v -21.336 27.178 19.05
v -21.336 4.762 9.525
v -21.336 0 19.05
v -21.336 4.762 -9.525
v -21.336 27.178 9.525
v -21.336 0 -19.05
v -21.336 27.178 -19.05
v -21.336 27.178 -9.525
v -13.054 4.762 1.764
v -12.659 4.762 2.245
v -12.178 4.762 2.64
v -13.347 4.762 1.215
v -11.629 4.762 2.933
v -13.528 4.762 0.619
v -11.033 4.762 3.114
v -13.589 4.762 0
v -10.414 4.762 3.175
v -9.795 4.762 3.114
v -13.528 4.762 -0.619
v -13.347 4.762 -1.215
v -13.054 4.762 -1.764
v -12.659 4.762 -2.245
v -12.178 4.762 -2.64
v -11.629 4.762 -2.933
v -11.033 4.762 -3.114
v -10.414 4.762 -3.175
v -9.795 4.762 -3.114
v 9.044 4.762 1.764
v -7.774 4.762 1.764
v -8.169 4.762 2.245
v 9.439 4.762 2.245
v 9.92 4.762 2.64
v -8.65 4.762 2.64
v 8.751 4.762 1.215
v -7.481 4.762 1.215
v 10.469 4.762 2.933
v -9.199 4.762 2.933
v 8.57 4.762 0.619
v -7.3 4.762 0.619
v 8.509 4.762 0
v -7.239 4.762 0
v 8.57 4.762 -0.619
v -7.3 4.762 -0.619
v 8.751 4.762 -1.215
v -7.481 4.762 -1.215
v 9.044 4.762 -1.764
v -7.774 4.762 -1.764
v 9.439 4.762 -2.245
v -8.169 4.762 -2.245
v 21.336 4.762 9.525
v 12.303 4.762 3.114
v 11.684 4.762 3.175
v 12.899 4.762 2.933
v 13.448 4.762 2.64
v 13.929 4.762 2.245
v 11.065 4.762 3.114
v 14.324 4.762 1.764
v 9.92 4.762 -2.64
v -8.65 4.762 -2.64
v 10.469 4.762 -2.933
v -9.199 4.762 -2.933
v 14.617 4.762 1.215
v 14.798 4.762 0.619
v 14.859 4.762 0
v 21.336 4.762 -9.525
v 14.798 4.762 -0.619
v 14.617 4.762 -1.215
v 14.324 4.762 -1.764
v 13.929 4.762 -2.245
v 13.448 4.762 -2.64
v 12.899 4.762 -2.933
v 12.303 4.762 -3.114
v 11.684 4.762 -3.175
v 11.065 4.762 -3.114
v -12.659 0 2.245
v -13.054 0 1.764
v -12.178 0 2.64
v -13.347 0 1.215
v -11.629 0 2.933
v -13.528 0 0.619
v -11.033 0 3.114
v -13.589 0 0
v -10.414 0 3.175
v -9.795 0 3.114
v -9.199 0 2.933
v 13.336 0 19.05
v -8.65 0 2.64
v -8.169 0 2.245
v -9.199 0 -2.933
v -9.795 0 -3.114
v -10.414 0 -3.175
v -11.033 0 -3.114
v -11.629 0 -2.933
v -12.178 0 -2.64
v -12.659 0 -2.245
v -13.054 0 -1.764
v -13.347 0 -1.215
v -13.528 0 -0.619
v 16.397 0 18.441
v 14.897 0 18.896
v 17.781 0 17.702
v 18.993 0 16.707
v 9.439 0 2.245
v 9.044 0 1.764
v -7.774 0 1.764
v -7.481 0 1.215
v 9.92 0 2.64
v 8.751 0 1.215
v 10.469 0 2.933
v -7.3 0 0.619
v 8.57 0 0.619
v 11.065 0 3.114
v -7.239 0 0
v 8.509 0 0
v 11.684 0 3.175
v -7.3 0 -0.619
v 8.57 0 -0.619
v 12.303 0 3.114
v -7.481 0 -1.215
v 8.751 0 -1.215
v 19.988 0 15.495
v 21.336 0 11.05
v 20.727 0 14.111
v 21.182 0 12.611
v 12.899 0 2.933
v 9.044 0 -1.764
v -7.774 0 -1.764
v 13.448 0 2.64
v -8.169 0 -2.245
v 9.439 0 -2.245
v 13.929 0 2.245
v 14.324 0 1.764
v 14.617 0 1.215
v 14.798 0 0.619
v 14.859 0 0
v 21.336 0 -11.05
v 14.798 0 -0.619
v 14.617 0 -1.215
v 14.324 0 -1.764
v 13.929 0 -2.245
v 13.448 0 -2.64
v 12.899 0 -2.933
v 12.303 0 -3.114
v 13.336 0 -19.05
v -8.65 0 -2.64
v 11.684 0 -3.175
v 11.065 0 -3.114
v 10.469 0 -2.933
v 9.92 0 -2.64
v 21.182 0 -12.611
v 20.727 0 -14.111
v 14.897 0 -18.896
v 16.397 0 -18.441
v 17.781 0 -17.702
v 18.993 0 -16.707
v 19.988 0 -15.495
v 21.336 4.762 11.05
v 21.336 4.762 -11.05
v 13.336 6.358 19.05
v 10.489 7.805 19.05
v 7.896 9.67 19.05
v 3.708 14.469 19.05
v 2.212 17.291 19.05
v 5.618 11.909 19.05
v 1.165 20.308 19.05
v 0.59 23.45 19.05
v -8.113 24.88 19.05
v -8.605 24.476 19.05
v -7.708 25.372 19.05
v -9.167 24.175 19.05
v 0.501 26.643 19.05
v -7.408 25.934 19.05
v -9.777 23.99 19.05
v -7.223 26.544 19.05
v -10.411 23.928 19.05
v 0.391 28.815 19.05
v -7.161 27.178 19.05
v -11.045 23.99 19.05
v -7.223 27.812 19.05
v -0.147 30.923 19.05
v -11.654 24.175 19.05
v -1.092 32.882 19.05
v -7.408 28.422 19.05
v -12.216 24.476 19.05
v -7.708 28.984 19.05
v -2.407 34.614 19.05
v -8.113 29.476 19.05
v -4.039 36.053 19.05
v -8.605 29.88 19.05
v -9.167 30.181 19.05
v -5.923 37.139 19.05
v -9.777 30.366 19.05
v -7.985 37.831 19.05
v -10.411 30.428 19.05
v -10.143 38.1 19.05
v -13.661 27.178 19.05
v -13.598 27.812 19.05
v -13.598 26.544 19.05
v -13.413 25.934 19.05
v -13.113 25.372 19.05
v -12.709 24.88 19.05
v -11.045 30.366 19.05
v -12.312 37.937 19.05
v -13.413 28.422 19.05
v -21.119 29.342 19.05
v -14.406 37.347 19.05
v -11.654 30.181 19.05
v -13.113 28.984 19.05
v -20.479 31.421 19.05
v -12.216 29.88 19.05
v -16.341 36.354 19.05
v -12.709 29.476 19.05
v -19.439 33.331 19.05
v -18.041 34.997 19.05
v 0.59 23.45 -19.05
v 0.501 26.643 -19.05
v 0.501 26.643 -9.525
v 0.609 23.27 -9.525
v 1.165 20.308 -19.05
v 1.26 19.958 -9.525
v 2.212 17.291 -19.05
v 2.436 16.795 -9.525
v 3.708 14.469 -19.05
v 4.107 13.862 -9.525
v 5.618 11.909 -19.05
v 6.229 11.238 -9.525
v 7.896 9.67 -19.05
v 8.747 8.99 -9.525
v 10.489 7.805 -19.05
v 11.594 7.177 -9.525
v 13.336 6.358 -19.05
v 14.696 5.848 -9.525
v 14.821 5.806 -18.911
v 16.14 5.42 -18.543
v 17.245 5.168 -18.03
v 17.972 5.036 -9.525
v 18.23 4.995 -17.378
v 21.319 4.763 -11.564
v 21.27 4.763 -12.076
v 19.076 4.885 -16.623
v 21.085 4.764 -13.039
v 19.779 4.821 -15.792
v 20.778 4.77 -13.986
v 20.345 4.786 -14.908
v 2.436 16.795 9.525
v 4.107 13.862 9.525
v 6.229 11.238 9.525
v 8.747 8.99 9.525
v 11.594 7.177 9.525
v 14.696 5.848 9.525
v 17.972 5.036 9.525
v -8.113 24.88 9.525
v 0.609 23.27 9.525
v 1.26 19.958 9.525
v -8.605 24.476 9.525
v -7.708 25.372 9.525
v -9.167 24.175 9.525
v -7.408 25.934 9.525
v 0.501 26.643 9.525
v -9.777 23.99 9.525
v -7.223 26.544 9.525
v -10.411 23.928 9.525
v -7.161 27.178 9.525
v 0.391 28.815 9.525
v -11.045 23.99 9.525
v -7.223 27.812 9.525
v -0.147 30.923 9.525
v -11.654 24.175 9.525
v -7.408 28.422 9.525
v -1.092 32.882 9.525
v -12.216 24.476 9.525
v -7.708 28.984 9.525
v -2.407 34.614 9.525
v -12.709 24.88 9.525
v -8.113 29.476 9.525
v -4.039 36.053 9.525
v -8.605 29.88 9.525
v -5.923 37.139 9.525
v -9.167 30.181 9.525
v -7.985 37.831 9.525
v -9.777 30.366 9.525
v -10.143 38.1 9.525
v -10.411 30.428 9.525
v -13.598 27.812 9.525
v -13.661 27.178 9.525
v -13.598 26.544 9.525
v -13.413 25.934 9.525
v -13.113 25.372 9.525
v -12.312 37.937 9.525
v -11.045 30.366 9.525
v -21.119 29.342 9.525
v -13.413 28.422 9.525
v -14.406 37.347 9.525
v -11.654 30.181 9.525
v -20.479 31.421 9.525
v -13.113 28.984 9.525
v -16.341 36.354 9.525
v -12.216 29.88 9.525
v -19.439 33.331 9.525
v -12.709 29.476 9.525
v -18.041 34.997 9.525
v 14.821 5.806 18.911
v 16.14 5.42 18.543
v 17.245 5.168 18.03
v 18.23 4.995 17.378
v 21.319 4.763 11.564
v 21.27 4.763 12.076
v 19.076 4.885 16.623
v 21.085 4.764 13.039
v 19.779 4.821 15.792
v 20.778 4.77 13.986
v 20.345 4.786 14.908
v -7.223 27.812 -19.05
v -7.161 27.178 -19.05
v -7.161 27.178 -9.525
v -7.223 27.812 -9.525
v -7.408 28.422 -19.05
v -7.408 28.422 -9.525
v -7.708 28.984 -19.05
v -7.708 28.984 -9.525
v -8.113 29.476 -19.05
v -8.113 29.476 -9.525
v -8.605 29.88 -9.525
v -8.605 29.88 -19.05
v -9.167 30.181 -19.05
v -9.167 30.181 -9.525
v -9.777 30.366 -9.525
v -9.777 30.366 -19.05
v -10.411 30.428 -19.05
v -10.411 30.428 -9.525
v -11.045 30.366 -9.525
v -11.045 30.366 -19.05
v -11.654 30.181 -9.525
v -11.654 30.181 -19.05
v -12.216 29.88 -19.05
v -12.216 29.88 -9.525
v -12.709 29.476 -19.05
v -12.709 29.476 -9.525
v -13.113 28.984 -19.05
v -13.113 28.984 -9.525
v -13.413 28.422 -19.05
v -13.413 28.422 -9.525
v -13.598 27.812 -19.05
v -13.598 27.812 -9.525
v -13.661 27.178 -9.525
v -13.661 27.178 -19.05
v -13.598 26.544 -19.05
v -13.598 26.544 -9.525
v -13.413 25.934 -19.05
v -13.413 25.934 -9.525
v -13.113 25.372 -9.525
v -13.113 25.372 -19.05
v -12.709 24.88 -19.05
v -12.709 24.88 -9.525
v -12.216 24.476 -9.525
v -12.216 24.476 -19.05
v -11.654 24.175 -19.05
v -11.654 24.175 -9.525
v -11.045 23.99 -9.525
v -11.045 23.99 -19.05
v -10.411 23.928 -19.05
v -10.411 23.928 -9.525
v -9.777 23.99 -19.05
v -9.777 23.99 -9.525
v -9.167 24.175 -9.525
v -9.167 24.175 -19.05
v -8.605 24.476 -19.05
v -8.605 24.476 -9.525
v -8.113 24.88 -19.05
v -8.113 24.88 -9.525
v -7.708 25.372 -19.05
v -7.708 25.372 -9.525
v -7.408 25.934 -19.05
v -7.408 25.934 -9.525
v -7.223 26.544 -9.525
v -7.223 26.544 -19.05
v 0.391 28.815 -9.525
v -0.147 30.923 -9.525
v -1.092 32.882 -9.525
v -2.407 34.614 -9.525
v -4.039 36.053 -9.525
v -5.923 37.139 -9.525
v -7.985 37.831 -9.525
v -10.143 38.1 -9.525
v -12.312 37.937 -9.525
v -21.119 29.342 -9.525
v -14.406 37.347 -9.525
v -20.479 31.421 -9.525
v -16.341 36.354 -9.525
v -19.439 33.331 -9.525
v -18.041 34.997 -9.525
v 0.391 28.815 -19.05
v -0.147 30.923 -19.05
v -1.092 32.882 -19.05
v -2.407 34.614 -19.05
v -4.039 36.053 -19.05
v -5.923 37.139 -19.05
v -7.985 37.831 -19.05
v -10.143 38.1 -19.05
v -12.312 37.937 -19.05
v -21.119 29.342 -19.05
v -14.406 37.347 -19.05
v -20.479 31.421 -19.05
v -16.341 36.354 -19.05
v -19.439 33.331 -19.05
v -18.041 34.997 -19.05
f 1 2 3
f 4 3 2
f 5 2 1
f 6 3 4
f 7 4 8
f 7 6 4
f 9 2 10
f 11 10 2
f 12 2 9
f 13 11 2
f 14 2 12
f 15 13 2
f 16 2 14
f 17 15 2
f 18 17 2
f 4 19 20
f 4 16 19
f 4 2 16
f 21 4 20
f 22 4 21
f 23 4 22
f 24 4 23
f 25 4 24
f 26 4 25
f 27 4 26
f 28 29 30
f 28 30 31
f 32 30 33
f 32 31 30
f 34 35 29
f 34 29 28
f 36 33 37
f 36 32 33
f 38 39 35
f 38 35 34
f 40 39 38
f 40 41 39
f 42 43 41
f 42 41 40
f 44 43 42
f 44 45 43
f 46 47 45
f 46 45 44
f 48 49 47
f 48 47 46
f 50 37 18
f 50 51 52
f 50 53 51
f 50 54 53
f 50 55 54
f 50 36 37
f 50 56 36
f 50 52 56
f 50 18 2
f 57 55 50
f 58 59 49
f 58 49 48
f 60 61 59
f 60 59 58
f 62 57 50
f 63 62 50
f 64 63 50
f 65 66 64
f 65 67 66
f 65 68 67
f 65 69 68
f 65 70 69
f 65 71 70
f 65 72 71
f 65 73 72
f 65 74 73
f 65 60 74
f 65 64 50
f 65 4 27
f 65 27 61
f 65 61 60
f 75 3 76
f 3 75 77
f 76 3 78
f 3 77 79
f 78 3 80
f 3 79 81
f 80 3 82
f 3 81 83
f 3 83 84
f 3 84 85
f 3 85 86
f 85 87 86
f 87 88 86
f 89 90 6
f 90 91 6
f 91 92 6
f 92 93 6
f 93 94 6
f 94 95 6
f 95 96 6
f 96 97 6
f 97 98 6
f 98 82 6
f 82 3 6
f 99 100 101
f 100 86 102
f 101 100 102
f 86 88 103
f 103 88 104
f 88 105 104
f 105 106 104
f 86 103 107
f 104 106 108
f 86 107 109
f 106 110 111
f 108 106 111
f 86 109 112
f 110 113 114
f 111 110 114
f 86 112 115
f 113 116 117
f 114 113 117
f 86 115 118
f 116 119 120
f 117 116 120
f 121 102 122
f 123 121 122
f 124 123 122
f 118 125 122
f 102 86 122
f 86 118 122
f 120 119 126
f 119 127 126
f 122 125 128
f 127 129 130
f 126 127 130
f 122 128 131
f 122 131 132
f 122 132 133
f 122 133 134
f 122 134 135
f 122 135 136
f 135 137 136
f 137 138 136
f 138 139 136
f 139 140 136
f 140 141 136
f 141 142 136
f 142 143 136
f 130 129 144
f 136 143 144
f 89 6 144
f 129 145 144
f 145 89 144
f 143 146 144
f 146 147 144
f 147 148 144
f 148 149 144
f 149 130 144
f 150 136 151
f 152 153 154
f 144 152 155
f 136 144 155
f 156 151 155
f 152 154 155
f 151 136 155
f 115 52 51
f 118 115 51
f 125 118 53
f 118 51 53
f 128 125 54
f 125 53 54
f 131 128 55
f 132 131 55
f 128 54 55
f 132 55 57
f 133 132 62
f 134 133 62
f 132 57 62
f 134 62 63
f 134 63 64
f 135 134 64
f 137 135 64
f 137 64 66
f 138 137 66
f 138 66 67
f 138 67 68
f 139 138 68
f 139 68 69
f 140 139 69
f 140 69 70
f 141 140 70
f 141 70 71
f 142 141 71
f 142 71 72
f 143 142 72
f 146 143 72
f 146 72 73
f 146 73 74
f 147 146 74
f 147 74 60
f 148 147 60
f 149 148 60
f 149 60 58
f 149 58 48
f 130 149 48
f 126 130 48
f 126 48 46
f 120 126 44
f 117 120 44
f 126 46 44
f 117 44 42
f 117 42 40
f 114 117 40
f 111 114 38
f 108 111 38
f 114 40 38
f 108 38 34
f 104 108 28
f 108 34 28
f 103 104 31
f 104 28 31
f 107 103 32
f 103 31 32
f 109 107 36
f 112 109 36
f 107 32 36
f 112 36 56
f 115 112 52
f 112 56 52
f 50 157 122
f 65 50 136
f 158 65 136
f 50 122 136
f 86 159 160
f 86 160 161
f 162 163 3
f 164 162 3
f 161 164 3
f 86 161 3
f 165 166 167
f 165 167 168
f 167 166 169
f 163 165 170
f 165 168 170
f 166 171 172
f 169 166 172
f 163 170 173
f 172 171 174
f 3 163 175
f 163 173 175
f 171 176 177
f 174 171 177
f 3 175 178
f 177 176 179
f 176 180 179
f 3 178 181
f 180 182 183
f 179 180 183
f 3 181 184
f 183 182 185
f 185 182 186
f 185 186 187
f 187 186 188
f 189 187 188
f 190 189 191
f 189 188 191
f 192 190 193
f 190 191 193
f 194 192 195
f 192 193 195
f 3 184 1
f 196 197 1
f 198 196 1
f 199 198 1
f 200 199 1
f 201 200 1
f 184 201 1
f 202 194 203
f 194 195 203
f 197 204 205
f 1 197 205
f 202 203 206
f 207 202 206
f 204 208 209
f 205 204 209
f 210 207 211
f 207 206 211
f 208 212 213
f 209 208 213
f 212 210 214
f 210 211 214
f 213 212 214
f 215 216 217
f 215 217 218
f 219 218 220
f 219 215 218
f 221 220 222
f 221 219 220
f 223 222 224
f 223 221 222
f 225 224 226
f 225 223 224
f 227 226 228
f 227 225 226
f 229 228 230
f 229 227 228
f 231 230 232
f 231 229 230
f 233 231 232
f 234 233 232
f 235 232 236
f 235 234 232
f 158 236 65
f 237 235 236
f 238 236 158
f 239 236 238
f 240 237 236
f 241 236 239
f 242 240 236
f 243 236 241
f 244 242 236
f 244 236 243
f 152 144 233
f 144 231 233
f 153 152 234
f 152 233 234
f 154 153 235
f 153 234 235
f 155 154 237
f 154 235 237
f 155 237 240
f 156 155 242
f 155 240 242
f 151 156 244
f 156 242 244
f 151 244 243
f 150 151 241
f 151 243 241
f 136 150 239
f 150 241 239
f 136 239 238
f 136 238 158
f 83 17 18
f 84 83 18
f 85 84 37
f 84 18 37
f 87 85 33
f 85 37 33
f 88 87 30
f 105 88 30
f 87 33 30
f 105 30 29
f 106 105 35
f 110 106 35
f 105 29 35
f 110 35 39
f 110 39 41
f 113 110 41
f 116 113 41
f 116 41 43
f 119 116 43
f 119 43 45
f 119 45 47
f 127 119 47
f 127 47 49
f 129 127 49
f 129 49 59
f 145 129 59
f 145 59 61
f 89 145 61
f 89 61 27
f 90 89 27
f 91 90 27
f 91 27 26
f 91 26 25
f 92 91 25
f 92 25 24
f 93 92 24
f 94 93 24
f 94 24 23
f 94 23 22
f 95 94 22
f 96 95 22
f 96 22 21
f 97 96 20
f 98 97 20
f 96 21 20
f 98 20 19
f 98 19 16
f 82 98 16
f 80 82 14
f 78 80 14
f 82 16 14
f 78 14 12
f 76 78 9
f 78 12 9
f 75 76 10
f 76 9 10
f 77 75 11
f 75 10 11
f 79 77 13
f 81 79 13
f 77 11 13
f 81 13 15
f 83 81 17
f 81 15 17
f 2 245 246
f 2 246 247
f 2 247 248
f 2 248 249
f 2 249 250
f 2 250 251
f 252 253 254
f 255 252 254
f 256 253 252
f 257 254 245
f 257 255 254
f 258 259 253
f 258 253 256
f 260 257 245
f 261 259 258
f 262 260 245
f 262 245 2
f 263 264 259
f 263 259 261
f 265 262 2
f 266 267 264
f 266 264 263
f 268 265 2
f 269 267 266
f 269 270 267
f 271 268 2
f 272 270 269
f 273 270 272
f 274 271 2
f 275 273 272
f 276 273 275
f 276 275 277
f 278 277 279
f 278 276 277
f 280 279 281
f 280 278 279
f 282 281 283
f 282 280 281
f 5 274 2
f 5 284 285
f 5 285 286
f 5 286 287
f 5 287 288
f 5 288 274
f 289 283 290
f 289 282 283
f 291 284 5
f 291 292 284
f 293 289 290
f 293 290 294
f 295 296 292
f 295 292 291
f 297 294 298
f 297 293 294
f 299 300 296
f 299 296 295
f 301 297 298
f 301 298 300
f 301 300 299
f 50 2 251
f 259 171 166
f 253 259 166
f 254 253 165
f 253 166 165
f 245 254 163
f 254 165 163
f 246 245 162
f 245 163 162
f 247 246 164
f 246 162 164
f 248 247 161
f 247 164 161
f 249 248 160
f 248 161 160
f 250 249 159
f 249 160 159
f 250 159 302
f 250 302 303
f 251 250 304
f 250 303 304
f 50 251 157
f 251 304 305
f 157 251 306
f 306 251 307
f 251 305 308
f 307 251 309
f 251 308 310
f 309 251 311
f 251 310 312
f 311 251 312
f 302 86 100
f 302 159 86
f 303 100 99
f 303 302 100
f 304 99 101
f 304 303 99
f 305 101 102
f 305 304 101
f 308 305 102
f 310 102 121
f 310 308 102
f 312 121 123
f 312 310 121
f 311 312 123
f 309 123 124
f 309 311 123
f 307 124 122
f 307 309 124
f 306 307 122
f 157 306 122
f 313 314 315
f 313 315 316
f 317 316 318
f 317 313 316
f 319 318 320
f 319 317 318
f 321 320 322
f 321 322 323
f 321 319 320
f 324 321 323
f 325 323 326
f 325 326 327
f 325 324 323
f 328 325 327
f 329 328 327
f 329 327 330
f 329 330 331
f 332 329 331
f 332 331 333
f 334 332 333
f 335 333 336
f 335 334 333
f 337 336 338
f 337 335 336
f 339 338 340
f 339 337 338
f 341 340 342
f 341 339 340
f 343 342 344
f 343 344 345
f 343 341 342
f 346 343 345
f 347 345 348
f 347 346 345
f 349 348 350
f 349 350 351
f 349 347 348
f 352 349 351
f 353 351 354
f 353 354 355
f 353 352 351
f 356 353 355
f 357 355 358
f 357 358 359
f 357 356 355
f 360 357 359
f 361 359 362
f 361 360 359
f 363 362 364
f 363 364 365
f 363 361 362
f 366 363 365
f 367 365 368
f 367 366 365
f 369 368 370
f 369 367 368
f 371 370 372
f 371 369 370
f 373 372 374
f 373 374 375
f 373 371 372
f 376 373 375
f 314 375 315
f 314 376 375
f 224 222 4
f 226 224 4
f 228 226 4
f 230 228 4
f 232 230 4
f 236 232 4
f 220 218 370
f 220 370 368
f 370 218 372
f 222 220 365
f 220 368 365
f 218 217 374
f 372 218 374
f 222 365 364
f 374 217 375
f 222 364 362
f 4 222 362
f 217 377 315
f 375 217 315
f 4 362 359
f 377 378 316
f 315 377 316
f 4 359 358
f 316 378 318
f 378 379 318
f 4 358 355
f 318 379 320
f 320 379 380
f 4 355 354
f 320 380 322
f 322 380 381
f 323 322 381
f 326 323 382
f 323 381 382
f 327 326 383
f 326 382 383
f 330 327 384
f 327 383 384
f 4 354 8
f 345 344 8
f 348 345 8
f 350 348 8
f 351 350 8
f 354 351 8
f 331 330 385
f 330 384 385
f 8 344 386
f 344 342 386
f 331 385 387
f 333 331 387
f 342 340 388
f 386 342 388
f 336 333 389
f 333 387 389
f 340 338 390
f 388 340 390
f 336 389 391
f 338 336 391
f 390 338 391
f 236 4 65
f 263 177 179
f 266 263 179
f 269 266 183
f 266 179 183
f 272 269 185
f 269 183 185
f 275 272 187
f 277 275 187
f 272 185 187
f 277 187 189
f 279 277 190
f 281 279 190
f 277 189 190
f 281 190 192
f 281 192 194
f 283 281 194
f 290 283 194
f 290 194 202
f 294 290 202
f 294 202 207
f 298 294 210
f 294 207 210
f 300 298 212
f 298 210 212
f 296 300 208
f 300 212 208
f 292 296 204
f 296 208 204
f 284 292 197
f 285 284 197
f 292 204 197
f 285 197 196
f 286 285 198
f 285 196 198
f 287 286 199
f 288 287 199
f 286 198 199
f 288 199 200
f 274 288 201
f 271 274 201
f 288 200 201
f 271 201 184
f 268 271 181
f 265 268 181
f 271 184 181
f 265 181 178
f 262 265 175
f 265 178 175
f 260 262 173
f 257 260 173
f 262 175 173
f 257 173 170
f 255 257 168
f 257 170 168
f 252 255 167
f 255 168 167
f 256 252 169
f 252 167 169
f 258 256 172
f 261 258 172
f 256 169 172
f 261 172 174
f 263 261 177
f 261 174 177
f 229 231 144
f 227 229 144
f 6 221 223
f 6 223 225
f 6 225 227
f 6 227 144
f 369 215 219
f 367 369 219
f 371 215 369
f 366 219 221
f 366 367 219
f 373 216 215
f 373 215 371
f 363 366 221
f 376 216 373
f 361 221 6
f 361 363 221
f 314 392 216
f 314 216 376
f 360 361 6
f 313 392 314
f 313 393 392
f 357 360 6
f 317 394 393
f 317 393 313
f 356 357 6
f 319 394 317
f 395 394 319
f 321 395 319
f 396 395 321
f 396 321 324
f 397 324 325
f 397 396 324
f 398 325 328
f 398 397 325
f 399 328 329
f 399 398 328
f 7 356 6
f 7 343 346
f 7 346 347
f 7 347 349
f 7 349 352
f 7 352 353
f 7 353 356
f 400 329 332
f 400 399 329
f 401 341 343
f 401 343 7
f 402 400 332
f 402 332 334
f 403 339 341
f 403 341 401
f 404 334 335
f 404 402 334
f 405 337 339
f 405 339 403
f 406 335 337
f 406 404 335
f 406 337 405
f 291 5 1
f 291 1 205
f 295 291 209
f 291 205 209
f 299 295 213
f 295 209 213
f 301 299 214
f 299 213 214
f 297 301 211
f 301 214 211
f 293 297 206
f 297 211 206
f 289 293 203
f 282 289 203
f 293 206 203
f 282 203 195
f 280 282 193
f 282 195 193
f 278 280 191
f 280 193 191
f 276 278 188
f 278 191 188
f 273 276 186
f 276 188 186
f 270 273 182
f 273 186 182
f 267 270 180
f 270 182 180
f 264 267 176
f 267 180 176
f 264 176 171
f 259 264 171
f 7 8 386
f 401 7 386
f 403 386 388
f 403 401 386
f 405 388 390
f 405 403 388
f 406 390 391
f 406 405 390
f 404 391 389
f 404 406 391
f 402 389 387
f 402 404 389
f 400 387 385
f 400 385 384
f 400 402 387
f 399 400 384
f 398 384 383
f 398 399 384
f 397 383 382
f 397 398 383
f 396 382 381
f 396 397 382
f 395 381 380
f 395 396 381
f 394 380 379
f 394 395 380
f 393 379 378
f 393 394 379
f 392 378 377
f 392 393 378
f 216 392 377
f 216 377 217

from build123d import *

# Parameters (mm, degrees)
SKETCH1_W           = 42.672
SKETCH1_H           = 38.1
BOSS_EXTRUDE1_DEPTH = 4.7625
SKETCH2_R           = 3.25
BOSS_EXTRUDE2_DEPTH = 9.525
SKETCH3_R           = 3.175
CUT_EXTRUDE1_DEPTH  = 9.525
FILLET1_R           = 8


with BuildPart() as part:
    # Sketch1 → Boss-Extrude1 (new body)
    with BuildSketch(Plane(origin=(0, 0, 0), x_dir=(1, 0, 0), z_dir=(0, 1, 0))):
        Rectangle(SKETCH1_W, SKETCH1_H)
    extrude(amount=BOSS_EXTRUDE1_DEPTH)

    # Sketch2 → Boss-Extrude2 (add)
    with BuildSketch(Plane.XY.offset(19.05)):
        with BuildLine():
            Line((-21.336, 4.7625), (-21.336, 27.178))
            ThreePointArc((-21.336, 27.178), (-10.143235589, 38.1), (0.501451896, 26.643181614))
            ThreePointArc((0.501451896, 26.643181614), (6.229357234, 11.237674696), (21.336, 4.7625))
            Line((21.336, 4.7625), (-21.336, 4.7625))
        make_face()
        with Locations((-10.410724966, 27.178)):
            Circle(SKETCH2_R, mode=Mode.SUBTRACT)
    boss_extrude2 = extrude(amount=-BOSS_EXTRUDE2_DEPTH)

    # Mirror1: Boss-Extrude2 across plane
    add(boss_extrude2.mirror(Plane.XY))

    # Sketch3 → Cut-Extrude1 (cut)
    with BuildSketch(Plane(origin=(0, 4.7625, 0), x_dir=(1, 0, 0), z_dir=(0, 1, 0))):
        with Locations(Location((-10.414, 0, 0), (0, 0, 270))):
            Circle(SKETCH3_R)
        with Locations(Location((11.684, 0, 0), (0, 0, 270))):
            Circle(SKETCH3_R)
    extrude(amount=-CUT_EXTRUDE1_DEPTH, mode=Mode.SUBTRACT)

    # Fillet1
    fillet1_edges = [part.edges().sort_by_distance(p)[0] for p in [
        (21.336, 2.38125, -19.05),
        (21.336, 2.38125, 19.05),
    ]]
    fillet(fillet1_edges, radius=FILLET1_R)


solid = part.part
